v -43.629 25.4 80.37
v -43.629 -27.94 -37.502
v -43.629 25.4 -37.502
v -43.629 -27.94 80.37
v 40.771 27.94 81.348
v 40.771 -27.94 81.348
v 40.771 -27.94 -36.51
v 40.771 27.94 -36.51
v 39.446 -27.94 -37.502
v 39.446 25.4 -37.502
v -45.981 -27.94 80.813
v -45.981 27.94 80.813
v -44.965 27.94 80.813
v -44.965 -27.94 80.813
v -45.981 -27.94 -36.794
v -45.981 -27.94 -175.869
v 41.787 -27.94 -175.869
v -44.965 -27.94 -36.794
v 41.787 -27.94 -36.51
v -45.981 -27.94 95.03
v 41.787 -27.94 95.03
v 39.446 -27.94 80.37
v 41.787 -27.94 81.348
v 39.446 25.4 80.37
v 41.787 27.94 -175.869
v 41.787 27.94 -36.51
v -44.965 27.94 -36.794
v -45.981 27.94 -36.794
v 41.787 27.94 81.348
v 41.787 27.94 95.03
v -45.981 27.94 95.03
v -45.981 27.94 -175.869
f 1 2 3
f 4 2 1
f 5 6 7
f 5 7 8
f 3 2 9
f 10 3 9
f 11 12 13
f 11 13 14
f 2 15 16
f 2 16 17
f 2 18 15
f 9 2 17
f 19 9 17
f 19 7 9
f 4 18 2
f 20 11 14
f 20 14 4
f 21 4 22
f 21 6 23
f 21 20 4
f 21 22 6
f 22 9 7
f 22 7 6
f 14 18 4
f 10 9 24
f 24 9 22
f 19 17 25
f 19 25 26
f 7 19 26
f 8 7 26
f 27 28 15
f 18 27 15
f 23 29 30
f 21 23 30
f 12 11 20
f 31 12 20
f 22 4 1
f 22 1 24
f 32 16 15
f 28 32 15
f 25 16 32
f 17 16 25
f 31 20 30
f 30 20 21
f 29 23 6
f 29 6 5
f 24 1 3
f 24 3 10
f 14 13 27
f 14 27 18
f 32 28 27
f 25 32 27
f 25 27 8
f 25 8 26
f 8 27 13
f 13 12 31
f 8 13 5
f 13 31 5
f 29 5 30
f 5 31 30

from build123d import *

# Parameters (mm, degrees)
F0_W     = 87.7677612007
F0_H     = 270.8992287517
F0_W_2   = 82.2834707797
F0_H_2   = 132.241293788
F1_DEPTH = 27.94
F2_W     = 83.075709641
F2_H     = 117.8717985749
F3_DEPTH = 53.34
F4_W     = 55.88
F4_H     = 117.8577281535
F5_DEPTH = 1.016
F6_W     = 55.88
F6_H     = 117.6069006324
F7_DEPTH = 1.016


with BuildPart() as f1:
    # F0 (on Front) → F1 (new body, symmetric)
    with BuildSketch(Plane.XZ):
        with Locations((-2.0966473967, -40.4195971787)):
            Rectangle(F0_W, F0_H)
        with Locations((-2.0786840469, 17.0819833875)):
            Rectangle(F0_W_2, F0_H_2, mode=Mode.SUBTRACT)
        with Locations((-2.0786840469, 17.0819833875)):
            Rectangle(F0_W_2, F0_H_2)
    extrude(amount=F1_DEPTH, both=True)

    # F2 (on face) → F3 (cut)
    with BuildSketch(Plane.XZ.offset(27.94)):
        with Locations((-2.0913966, 21.4343853295)):
            Rectangle(F2_W, F2_H)
    extrude(amount=-F3_DEPTH, mode=Mode.SUBTRACT)

    # F4 (on face) → F5 (cut)
    with BuildSketch(Plane.YZ.offset(41.7872332036)):
        with Locations((0, 22.4192347378)):
            Rectangle(F4_W, F4_H)
    extrude(amount=-F5_DEPTH, mode=Mode.SUBTRACT)

    # F6 (on face) → F7 (cut)
    with BuildSketch(Plane(origin=(-45.980527997, 0, 0), x_dir=(0, -1, 0), z_dir=(-1, 0, 0))):
        with Locations((0, 22.0092870295)):
            Rectangle(F6_W, F6_H)
    extrude(amount=-F7_DEPTH, mode=Mode.SUBTRACT)


solid = f1.part
